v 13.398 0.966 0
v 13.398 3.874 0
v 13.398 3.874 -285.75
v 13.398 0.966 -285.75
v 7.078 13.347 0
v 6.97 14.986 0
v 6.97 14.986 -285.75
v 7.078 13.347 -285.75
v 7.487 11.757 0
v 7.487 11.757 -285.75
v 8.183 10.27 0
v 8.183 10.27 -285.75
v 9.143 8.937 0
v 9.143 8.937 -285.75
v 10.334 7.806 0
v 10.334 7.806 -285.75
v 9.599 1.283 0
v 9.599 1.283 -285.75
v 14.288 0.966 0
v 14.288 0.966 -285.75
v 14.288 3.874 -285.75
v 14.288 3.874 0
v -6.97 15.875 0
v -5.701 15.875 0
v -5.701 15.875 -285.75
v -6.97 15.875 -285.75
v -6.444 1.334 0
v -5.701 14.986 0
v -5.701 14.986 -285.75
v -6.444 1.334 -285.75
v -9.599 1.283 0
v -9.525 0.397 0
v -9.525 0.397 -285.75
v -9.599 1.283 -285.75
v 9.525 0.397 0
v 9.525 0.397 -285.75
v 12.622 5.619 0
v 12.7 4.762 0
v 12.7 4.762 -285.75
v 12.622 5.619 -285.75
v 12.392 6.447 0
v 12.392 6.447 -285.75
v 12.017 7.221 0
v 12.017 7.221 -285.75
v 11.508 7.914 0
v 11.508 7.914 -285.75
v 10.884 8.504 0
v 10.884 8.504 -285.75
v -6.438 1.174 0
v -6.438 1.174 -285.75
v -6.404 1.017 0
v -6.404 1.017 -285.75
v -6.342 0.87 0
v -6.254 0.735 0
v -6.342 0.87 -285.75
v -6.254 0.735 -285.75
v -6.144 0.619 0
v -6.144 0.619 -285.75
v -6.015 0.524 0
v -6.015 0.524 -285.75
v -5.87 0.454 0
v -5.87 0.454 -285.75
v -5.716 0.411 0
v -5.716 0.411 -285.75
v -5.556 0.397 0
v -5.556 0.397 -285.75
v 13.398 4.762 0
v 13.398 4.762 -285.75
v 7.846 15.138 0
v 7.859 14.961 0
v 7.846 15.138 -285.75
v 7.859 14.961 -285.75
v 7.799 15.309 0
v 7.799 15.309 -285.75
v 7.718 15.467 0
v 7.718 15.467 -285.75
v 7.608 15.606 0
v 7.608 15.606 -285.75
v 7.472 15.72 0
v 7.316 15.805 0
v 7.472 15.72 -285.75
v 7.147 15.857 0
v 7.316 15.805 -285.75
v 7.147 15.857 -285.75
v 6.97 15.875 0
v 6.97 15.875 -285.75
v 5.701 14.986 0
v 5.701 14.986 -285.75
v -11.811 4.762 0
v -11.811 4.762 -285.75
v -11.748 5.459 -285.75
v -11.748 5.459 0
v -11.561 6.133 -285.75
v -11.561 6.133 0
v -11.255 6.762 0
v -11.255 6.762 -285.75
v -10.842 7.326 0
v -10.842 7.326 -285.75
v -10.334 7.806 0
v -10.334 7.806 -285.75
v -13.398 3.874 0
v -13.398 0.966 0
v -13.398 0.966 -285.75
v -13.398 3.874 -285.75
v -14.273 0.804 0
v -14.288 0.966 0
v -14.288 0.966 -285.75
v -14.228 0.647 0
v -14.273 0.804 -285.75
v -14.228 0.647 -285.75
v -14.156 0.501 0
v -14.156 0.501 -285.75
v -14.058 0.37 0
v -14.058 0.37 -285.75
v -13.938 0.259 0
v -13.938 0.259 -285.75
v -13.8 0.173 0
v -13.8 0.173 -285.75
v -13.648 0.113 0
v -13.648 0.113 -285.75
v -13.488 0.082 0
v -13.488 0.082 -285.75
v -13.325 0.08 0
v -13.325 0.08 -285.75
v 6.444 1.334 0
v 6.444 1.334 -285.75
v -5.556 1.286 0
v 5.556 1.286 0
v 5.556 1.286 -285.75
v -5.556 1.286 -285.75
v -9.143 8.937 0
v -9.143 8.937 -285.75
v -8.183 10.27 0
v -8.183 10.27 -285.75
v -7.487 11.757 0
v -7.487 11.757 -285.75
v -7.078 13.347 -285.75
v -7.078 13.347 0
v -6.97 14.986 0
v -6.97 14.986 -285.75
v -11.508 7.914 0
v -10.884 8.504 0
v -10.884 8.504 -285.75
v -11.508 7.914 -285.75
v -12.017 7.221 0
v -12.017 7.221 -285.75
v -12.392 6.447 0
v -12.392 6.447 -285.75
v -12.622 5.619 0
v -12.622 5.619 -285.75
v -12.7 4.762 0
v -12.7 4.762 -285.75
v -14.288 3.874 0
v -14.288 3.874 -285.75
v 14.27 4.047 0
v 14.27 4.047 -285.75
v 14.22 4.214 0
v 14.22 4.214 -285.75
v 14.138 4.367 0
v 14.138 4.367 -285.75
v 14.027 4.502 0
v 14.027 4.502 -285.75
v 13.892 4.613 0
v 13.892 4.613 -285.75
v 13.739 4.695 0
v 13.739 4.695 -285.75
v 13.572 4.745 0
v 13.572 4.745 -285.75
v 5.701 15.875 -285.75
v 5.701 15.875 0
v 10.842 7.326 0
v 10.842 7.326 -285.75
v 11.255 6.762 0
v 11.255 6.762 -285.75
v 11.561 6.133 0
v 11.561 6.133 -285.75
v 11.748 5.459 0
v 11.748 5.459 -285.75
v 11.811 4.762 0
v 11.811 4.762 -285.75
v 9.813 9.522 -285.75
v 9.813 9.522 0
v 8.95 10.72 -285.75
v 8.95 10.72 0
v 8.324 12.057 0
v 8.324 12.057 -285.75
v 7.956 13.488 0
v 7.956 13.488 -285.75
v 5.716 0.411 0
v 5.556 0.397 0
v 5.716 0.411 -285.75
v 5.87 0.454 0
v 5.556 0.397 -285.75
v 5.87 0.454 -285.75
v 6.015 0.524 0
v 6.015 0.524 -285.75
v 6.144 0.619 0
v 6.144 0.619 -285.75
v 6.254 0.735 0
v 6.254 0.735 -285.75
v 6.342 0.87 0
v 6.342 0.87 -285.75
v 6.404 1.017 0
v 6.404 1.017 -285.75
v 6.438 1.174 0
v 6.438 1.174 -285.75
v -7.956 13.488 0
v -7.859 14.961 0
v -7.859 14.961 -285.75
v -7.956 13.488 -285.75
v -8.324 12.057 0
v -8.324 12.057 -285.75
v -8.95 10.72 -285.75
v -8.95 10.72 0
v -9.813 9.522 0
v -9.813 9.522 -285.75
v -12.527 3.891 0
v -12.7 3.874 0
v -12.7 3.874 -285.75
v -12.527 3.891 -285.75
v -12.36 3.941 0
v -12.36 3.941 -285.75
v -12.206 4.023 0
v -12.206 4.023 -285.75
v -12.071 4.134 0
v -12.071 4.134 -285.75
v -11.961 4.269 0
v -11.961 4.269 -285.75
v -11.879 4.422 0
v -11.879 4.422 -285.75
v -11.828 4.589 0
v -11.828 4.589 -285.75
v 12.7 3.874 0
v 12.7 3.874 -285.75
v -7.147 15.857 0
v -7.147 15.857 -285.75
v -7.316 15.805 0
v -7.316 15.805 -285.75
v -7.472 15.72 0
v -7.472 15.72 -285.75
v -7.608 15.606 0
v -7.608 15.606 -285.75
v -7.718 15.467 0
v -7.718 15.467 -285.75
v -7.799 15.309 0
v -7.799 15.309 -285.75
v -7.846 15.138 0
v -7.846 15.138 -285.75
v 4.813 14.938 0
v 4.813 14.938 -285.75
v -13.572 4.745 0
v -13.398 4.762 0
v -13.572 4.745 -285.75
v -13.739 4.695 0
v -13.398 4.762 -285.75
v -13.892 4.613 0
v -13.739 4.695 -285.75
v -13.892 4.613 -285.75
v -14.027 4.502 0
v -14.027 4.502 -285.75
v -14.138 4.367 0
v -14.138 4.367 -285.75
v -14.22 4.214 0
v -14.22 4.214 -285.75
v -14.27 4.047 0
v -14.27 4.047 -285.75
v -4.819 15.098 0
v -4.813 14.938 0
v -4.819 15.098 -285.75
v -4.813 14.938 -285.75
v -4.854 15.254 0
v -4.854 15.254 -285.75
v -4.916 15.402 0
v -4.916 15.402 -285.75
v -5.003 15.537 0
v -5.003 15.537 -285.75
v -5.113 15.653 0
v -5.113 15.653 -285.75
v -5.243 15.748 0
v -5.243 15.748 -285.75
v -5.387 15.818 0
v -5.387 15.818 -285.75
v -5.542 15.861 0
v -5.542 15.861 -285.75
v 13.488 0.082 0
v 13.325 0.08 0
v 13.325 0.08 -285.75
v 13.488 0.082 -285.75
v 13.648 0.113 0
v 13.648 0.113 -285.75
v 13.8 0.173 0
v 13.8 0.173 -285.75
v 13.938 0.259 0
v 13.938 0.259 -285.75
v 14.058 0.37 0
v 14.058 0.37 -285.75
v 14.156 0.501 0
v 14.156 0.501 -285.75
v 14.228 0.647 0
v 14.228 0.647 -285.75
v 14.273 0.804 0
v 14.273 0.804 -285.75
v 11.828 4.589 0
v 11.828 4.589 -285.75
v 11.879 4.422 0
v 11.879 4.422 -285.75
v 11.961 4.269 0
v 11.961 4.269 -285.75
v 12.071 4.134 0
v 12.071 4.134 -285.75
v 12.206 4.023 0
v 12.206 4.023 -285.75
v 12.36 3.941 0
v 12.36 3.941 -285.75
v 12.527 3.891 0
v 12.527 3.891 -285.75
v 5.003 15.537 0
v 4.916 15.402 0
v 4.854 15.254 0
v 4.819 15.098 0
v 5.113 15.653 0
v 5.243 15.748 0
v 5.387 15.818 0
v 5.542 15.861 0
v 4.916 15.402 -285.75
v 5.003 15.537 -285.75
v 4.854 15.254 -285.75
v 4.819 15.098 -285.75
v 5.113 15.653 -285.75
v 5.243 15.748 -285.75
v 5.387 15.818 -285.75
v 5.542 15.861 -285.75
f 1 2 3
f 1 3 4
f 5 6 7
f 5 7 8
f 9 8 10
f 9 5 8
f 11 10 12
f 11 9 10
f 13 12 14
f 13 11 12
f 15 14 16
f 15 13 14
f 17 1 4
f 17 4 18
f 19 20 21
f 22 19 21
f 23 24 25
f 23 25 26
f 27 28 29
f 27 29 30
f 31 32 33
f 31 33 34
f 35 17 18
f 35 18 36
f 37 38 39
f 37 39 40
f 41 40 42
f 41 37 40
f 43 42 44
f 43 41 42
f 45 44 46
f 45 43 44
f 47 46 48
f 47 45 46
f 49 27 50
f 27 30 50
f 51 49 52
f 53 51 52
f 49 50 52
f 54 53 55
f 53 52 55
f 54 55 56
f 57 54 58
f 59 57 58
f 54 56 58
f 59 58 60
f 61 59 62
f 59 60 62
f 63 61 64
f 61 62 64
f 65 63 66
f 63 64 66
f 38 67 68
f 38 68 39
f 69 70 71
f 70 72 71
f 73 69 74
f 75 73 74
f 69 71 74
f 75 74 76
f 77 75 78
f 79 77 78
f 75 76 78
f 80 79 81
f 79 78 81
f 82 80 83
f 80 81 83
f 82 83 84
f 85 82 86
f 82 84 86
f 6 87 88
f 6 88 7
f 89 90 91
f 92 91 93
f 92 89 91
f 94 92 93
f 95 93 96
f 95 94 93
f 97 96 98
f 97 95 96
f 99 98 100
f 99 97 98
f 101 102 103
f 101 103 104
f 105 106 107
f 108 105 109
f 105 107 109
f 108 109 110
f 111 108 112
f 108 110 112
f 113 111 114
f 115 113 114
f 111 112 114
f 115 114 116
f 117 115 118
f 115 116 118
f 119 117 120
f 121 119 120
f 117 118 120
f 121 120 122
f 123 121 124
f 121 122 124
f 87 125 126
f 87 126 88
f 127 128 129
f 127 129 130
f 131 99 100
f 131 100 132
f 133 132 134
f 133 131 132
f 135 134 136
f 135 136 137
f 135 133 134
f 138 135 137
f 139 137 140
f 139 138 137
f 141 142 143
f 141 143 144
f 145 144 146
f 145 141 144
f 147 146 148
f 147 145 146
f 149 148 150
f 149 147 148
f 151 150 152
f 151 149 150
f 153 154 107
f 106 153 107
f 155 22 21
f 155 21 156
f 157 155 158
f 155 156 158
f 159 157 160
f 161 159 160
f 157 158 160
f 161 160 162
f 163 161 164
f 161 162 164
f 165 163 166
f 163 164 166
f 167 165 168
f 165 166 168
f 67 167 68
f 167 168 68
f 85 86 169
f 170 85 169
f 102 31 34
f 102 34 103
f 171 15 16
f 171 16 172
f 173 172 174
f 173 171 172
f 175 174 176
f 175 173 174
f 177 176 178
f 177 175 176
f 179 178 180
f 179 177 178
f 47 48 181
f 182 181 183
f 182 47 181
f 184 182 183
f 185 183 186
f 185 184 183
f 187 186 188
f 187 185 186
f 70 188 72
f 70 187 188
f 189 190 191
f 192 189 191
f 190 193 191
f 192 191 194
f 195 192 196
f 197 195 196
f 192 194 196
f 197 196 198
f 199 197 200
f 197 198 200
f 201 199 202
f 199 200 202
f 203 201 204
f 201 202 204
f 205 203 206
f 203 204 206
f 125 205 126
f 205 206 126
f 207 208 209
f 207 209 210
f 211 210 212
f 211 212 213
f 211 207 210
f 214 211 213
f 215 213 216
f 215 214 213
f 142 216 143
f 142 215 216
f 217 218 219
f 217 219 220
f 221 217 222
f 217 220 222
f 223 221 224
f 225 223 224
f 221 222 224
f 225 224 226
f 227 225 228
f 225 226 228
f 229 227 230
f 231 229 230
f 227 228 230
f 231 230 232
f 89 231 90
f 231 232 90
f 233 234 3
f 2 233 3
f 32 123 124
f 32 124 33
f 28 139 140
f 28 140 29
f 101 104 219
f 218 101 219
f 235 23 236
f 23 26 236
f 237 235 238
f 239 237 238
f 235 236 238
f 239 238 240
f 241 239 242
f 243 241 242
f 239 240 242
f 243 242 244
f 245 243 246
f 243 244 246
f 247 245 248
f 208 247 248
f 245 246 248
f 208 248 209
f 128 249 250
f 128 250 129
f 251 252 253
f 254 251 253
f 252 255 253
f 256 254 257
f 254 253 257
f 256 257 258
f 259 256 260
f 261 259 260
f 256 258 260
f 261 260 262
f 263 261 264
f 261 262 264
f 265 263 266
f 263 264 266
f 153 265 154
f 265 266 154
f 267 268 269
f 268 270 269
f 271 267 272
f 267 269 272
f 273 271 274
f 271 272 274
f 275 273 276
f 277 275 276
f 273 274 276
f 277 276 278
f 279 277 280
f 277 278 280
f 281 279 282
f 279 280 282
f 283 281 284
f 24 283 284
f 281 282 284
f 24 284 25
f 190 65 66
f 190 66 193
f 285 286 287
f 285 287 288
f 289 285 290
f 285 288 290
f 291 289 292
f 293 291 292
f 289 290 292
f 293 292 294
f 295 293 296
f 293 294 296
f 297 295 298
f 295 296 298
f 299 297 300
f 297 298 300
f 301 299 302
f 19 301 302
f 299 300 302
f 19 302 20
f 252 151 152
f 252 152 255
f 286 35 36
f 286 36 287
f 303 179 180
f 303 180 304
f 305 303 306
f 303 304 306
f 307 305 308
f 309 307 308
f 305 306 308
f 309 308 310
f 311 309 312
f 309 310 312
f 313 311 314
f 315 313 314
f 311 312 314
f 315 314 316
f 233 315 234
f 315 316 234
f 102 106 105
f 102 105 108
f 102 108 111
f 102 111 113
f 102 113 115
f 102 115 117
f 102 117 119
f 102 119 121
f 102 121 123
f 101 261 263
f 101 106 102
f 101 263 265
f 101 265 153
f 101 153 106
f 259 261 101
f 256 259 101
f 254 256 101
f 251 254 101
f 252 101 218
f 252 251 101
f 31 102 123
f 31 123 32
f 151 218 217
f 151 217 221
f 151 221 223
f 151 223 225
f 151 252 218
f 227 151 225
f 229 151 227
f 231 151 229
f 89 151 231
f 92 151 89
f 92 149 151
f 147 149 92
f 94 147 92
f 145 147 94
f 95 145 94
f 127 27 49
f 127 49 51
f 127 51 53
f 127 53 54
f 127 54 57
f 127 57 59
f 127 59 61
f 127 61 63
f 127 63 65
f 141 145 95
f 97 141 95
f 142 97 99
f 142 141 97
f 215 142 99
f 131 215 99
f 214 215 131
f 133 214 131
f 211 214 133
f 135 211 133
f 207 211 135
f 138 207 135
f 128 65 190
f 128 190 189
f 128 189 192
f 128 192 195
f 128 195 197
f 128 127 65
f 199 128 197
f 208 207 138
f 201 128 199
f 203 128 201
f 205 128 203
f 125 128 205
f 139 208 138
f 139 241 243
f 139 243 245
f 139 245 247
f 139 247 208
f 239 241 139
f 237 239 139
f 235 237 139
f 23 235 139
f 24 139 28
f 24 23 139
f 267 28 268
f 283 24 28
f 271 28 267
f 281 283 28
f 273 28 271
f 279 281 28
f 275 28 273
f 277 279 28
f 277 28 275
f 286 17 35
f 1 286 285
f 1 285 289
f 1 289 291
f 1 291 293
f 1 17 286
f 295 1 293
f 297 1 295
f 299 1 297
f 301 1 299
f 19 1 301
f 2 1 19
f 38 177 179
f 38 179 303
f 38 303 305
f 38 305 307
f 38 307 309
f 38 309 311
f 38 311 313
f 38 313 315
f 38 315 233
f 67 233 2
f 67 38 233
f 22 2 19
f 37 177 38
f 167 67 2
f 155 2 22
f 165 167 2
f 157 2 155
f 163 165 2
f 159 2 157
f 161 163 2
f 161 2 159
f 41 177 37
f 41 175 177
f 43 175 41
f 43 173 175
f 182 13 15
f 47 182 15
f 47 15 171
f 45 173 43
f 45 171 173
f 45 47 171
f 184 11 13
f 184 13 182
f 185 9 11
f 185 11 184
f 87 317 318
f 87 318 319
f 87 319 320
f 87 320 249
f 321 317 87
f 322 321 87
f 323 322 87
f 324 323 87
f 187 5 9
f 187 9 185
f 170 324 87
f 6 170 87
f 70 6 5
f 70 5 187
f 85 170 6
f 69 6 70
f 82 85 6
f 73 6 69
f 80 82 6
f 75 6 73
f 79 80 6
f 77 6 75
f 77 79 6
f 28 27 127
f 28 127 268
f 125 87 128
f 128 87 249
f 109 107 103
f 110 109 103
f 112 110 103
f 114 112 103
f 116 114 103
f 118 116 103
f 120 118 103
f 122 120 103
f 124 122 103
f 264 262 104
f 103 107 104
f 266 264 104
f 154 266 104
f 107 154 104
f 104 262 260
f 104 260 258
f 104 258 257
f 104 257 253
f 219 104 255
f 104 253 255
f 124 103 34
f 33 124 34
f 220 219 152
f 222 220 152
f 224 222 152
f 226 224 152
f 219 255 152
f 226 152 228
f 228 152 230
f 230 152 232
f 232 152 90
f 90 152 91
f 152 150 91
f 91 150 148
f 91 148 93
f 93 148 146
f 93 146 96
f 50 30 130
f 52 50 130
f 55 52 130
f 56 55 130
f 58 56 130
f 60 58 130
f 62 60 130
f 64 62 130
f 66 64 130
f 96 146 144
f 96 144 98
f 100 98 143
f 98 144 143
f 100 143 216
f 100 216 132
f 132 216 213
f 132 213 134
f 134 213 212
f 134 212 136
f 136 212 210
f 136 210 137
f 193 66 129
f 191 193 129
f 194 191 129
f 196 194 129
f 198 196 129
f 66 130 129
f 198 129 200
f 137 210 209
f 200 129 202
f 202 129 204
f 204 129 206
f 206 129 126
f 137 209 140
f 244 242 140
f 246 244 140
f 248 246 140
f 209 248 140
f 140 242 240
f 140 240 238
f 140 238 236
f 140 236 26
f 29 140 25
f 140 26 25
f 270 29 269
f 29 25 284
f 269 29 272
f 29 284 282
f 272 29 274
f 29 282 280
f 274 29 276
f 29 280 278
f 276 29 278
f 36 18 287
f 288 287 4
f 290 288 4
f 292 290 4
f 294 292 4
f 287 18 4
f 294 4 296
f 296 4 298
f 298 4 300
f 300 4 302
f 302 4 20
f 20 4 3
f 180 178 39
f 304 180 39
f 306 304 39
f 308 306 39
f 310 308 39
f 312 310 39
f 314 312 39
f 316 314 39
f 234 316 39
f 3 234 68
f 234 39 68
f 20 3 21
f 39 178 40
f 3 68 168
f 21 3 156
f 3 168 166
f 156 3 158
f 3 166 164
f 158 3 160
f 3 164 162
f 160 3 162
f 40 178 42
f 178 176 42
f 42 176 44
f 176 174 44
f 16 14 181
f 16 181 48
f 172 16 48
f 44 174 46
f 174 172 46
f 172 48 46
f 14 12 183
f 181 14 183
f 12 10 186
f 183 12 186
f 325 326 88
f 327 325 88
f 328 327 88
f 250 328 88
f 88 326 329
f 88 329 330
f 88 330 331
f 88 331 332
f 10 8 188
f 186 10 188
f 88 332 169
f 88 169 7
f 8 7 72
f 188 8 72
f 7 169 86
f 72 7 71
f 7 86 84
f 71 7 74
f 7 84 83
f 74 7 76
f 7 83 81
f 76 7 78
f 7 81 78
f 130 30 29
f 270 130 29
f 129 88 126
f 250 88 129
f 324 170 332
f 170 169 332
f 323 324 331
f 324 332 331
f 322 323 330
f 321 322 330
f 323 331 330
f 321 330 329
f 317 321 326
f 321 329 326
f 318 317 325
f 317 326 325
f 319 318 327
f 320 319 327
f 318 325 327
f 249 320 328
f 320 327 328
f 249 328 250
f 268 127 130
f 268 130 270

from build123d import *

# Parameters (mm, degrees)
EXTRUDE_THIN1_DEPTH = 285.75
FILLET1_R           = 0.889


with BuildPart() as part:
    # Sketch1 → Extrude-Thin1 (new body)
    with BuildSketch(Plane.XY):
        with BuildLine():
            Line((9.525, 0.396875), (14.2875, 0))
            Line((14.2875, 0), (14.2875, 4.7625))
            Line((14.2875, 4.7625), (12.7, 4.7625))
            ThreePointArc((12.7, 4.7625), (12.221883718, 6.842274605), (10.883532847, 8.504464286))
            ThreePointArc((10.883532847, 8.504464286), (8.423051877, 11.795038582), (7.9375, 15.875))
            Line((7.9375, 15.875), (4.7625, 15.875))
            Line((4.7625, 15.875), (5.55625, 1.285875))
            Line((5.55625, 1.285875), (-5.55625, 1.285875))
            Line((-5.55625, 1.285875), (-4.7625, 15.875))
            Line((-4.7625, 15.875), (-7.9375, 15.875))
            ThreePointArc((-7.9375, 15.875), (-8.423051877, 11.795038582), (-10.883532847, 8.504464286))
            ThreePointArc((-10.883532847, 8.504464286), (-12.221883718, 6.842274605), (-12.7, 4.7625))
            Line((-12.7, 4.7625), (-14.2875, 4.7625))
            Line((-14.2875, 4.7625), (-14.2875, 0))
            Line((-14.2875, 0), (-9.525, 0.396875))
            Line((-9.525, 0.396875), (-9.598827432, 1.282804179))
            Line((-9.598827432, 1.282804179), (-13.3985, 0.966164798))
            Line((-13.3985, 0.966164798), (-13.3985, 3.8735))
            Line((-13.3985, 3.8735), (-11.707603613, 3.8735))
            ThreePointArc((-11.707603613, 3.8735), (-11.594220702, 6.040152518), (-10.333606715, 7.805964286))
            ThreePointArc((-10.333606715, 7.805964286), (-7.800475833, 10.997107398), (-6.970486535, 14.986))
            Line((-6.970486535, 14.986), (-5.701182591, 14.986))
            Line((-5.701182591, 14.986), (-6.494932591, 0.396875))
            Line((-6.494932591, 0.396875), (6.494932591, 0.396875))
            Line((6.494932591, 0.396875), (5.701182591, 14.986))
            Line((5.701182591, 14.986), (6.970486535, 14.986))
            ThreePointArc((6.970486535, 14.986), (7.800475833, 10.997107398), (10.333606715, 7.805964286))
            ThreePointArc((10.333606715, 7.805964286), (11.594220702, 6.040152518), (11.707603613, 3.8735))
            Line((11.707603613, 3.8735), (13.3985, 3.8735))
            Line((13.3985, 3.8735), (13.3985, 0.966164798))
            Line((13.3985, 0.966164798), (9.598827432, 1.282804179))
            Line((9.598827432, 1.282804179), (9.525, 0.396875))
        make_face()
    extrude(amount=-EXTRUDE_THIN1_DEPTH)

    # Fillet1
    fillet1_edges = [part.edges().sort_by_distance(p)[0] for p in [
        (11.707603613, 3.8735, -142.875),
        (6.494932591, 0.396875, -142.875),
        (-6.494932591, 0.396875, -142.875),
        (-11.707603613, 3.8735, -142.875),
        (-14.2875, 0, -142.875),
        (-14.2875, 4.7625, -142.875),
        (-7.9375, 15.875, -142.875),
        (-4.7625, 15.875, -142.875),
        (4.7625, 15.875, -142.875),
        (7.9375, 15.875, -142.875),
        (14.2875, 4.7625, -142.875),
        (14.2875, 0, -142.875),
    ]]
    fillet(fillet1_edges, radius=FILLET1_R)


solid = part.part
